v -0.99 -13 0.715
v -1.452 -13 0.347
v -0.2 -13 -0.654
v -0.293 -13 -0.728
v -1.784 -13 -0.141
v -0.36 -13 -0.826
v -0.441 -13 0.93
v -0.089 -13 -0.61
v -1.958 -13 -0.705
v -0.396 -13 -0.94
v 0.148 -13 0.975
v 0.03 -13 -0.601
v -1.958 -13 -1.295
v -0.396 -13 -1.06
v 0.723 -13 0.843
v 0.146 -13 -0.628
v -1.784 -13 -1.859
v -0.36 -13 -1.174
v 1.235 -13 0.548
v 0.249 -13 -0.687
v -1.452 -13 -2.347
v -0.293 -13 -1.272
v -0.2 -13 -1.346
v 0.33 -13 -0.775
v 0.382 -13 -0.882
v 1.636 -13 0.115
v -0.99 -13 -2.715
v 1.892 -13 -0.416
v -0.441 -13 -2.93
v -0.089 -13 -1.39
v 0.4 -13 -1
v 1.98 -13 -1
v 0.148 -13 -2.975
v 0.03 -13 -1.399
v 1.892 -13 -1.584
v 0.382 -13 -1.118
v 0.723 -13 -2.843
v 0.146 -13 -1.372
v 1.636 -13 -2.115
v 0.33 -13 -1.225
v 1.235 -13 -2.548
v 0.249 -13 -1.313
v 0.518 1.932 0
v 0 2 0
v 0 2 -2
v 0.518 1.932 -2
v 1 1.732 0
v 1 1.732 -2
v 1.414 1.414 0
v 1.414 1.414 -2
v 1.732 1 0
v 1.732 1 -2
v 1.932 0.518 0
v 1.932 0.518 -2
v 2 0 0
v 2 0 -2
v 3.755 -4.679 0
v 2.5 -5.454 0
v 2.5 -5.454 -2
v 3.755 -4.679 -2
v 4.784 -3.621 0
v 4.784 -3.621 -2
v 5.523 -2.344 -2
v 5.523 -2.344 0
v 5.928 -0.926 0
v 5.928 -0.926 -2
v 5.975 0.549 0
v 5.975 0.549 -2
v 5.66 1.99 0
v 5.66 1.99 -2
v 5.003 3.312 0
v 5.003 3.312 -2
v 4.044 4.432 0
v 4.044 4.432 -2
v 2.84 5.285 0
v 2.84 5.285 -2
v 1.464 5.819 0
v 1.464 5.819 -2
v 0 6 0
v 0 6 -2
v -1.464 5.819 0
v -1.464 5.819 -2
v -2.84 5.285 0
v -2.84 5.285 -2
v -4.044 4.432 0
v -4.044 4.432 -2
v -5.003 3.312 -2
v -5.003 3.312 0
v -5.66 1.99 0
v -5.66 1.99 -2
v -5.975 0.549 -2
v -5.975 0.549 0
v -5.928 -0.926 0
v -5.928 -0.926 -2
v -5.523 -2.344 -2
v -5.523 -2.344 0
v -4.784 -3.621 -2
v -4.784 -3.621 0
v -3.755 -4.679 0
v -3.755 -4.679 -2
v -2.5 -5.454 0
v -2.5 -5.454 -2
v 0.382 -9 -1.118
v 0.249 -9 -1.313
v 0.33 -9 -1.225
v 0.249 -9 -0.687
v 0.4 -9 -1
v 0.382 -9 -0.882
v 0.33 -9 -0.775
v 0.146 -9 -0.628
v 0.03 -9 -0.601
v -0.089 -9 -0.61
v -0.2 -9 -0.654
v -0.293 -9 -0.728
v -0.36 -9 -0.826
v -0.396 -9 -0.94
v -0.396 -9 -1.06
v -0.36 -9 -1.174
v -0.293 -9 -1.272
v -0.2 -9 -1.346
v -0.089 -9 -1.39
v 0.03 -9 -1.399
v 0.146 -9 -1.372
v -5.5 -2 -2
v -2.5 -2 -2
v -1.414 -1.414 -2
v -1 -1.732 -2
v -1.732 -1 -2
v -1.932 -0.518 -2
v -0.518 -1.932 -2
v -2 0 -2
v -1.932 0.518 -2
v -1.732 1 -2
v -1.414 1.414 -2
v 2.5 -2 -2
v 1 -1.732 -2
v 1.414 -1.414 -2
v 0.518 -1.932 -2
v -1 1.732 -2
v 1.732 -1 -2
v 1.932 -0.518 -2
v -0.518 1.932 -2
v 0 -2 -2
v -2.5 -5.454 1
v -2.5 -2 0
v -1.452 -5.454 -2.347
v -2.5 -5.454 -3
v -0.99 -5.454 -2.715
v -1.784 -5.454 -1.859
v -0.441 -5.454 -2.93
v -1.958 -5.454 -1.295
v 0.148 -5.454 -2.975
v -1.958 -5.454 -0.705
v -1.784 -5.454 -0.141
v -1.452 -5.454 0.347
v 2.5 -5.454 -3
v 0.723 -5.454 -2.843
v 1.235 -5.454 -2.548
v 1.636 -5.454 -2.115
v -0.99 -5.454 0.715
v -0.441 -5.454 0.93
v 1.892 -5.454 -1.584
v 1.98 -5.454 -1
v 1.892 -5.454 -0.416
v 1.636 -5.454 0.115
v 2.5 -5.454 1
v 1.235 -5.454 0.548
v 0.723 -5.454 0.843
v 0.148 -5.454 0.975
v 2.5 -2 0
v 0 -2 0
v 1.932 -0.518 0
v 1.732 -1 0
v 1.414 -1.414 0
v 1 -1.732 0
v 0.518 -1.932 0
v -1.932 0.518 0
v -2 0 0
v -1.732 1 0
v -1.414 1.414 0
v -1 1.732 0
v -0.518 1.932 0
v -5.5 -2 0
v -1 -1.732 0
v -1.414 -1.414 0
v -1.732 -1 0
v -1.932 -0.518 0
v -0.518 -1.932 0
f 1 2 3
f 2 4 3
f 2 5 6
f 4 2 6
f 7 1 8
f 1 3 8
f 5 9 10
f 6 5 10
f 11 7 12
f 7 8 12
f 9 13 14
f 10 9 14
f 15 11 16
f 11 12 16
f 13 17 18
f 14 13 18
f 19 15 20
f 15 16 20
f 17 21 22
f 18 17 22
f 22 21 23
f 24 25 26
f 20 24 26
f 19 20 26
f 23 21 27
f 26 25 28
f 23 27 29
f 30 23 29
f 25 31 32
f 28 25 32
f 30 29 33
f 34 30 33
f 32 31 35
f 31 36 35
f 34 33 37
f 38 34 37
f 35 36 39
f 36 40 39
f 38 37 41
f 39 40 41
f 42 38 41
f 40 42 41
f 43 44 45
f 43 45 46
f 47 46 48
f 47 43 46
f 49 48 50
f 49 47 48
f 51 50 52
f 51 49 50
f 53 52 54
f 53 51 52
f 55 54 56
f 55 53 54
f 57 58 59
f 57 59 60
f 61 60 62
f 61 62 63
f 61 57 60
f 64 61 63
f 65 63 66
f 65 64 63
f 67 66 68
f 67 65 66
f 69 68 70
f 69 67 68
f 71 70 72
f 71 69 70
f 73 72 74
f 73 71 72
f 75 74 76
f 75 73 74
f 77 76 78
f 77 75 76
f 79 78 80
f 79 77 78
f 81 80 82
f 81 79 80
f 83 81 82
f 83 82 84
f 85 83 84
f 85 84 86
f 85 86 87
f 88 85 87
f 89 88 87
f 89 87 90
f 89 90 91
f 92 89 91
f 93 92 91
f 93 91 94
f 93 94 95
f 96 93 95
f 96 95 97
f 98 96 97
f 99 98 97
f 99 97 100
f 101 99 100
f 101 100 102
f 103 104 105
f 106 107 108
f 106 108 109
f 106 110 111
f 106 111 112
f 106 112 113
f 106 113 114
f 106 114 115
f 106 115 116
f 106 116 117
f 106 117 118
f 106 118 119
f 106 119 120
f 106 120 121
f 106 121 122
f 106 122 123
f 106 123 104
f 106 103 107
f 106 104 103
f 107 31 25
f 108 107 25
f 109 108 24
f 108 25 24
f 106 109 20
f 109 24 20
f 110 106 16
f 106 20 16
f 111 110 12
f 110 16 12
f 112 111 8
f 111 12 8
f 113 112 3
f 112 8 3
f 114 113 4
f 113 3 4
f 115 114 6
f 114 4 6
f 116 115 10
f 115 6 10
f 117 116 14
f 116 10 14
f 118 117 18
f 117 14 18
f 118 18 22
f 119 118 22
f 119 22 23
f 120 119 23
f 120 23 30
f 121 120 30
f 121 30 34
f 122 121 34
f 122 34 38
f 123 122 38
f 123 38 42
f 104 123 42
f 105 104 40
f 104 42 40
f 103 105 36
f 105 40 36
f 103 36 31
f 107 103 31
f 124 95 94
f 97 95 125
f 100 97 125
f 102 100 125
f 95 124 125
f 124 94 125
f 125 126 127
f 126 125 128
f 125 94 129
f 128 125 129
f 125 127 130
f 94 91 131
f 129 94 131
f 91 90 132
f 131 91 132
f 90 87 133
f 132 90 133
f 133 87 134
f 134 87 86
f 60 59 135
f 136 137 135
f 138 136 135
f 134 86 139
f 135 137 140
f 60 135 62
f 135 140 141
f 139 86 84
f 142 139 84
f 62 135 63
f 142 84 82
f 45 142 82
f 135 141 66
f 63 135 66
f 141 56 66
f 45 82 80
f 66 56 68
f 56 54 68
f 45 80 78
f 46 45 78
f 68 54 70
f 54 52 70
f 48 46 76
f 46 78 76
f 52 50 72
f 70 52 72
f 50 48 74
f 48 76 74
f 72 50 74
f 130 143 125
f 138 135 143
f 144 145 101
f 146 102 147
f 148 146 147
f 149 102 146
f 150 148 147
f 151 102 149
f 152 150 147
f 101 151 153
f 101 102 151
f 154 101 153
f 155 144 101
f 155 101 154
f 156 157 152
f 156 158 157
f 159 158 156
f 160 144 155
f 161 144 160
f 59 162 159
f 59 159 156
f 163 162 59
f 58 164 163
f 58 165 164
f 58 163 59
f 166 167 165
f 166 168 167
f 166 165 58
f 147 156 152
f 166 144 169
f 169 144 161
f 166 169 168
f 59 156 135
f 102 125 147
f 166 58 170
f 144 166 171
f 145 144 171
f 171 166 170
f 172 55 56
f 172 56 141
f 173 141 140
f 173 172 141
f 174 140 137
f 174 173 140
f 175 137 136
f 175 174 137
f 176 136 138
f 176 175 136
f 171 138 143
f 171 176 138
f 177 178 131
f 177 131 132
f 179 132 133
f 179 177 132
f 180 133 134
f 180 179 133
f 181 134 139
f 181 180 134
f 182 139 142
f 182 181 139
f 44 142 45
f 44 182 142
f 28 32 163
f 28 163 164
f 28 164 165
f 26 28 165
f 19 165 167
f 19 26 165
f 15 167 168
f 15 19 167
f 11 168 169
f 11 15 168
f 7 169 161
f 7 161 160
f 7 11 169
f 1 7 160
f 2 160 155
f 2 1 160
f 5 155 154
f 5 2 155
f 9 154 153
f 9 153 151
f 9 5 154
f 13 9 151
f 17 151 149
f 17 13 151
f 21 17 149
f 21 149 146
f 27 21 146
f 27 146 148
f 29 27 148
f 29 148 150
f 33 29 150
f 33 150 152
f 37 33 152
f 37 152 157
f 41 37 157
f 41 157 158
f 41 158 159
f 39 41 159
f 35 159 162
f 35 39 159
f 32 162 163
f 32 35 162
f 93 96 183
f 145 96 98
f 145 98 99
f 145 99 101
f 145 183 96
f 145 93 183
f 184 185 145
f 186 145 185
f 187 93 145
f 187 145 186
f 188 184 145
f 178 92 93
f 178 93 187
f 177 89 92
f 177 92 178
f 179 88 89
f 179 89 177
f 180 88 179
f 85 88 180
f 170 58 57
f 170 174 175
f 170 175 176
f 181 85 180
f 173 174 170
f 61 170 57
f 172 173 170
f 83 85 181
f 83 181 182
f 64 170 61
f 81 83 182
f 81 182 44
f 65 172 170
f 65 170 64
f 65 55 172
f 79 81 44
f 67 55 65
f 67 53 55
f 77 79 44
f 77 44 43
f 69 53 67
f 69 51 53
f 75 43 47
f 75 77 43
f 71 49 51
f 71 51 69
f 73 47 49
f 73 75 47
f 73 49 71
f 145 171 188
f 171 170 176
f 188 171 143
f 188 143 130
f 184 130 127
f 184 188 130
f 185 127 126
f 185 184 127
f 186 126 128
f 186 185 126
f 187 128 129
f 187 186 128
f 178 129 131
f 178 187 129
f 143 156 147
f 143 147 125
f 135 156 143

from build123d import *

# Parameters (mm, degrees)
BOSS_EXTRUDE1_DEPTH      = 2
BOSS_EXTRUDE3_DEPTH      = 1
BOSS_EXTRUDE3_DEPTH_BACK = 3
SKETCH3_W                = 5
SKETCH3_H                = 4
SKETCH3_R                = 1.980106187
CUT_EXTRUDE1_DEPTH       = 7.545644
CUT_EXTRUDE2_DEPTH       = 8
SKETCH6_R                = 0.4
CUT_EXTRUDE3_DEPTH       = 4


with BuildPart() as part:
    # Sketch1 → Boss-Extrude1 (new body)
    with BuildSketch(Plane.XY):
        with BuildLine():
            ThreePointArc((0, 2), (1.414213562, 1.414213562), (2, 0))
            Line((2, 0), (6, 0))
            ThreePointArc((6, 0), (0, 6), (-6, 0))
            Line((-6, 0), (-2, 0))
            ThreePointArc((-2, 0), (-1.414213562, 1.414213562), (0, 2))
        make_face()
        with BuildLine():
            Line((6, 0), (2, 0))
            ThreePointArc((2, 0), (1.414213562, -1.414213562), (0, -2))
            ThreePointArc((0, -2), (-1.414213562, -1.414213562), (-2, 0))
            Line((-2, 0), (-6, 0))
            ThreePointArc((-6, 0), (0, -6), (6, 0))
        make_face()
    extrude(amount=-BOSS_EXTRUDE1_DEPTH)

    # Sketch2 → Boss-Extrude3 (add, two sides: drawn at the far end of the back side and taken through both)
    with BuildSketch(Plane.XY.offset(-BOSS_EXTRUDE3_DEPTH_BACK)):
        Polygon((-2.5, -13), (2.5, -13), (2.5, -5.454356057), (2.5, -2), (-2.5, -2), (-2.5, -5.454356057), align=None)
    extrude(amount=BOSS_EXTRUDE3_DEPTH + BOSS_EXTRUDE3_DEPTH_BACK)

    # Sketch3 → Cut-Extrude1 (cut)
    with BuildSketch(Plane.XZ.offset(13)):
        with Locations((0, -1)):
            Rectangle(SKETCH3_W, SKETCH3_H)
        with Locations((0, -1)):
            Circle(SKETCH3_R, mode=Mode.SUBTRACT)
    extrude(amount=-CUT_EXTRUDE1_DEPTH, mode=Mode.SUBTRACT)

    # Sketch5 → Cut-Extrude2 (cut)
    with BuildSketch(Plane(origin=(2.5, 0, 0), x_dir=(0, 0, -1), z_dir=(1, 0, 0))):
        Polygon((-1, -5.454356057), (0, -2), (-1, -2), align=None)
        Polygon((3, -5.454356057), (2, -2), (3, -2), align=None)
    extrude(amount=-CUT_EXTRUDE2_DEPTH, mode=Mode.SUBTRACT)

    # Sketch6 → Cut-Extrude3 (cut)
    with BuildSketch(Plane.XZ.offset(13)):
        with Locations((0, -1)):
            Circle(SKETCH6_R)
    extrude(amount=-CUT_EXTRUDE3_DEPTH, mode=Mode.SUBTRACT)


solid = part.part
